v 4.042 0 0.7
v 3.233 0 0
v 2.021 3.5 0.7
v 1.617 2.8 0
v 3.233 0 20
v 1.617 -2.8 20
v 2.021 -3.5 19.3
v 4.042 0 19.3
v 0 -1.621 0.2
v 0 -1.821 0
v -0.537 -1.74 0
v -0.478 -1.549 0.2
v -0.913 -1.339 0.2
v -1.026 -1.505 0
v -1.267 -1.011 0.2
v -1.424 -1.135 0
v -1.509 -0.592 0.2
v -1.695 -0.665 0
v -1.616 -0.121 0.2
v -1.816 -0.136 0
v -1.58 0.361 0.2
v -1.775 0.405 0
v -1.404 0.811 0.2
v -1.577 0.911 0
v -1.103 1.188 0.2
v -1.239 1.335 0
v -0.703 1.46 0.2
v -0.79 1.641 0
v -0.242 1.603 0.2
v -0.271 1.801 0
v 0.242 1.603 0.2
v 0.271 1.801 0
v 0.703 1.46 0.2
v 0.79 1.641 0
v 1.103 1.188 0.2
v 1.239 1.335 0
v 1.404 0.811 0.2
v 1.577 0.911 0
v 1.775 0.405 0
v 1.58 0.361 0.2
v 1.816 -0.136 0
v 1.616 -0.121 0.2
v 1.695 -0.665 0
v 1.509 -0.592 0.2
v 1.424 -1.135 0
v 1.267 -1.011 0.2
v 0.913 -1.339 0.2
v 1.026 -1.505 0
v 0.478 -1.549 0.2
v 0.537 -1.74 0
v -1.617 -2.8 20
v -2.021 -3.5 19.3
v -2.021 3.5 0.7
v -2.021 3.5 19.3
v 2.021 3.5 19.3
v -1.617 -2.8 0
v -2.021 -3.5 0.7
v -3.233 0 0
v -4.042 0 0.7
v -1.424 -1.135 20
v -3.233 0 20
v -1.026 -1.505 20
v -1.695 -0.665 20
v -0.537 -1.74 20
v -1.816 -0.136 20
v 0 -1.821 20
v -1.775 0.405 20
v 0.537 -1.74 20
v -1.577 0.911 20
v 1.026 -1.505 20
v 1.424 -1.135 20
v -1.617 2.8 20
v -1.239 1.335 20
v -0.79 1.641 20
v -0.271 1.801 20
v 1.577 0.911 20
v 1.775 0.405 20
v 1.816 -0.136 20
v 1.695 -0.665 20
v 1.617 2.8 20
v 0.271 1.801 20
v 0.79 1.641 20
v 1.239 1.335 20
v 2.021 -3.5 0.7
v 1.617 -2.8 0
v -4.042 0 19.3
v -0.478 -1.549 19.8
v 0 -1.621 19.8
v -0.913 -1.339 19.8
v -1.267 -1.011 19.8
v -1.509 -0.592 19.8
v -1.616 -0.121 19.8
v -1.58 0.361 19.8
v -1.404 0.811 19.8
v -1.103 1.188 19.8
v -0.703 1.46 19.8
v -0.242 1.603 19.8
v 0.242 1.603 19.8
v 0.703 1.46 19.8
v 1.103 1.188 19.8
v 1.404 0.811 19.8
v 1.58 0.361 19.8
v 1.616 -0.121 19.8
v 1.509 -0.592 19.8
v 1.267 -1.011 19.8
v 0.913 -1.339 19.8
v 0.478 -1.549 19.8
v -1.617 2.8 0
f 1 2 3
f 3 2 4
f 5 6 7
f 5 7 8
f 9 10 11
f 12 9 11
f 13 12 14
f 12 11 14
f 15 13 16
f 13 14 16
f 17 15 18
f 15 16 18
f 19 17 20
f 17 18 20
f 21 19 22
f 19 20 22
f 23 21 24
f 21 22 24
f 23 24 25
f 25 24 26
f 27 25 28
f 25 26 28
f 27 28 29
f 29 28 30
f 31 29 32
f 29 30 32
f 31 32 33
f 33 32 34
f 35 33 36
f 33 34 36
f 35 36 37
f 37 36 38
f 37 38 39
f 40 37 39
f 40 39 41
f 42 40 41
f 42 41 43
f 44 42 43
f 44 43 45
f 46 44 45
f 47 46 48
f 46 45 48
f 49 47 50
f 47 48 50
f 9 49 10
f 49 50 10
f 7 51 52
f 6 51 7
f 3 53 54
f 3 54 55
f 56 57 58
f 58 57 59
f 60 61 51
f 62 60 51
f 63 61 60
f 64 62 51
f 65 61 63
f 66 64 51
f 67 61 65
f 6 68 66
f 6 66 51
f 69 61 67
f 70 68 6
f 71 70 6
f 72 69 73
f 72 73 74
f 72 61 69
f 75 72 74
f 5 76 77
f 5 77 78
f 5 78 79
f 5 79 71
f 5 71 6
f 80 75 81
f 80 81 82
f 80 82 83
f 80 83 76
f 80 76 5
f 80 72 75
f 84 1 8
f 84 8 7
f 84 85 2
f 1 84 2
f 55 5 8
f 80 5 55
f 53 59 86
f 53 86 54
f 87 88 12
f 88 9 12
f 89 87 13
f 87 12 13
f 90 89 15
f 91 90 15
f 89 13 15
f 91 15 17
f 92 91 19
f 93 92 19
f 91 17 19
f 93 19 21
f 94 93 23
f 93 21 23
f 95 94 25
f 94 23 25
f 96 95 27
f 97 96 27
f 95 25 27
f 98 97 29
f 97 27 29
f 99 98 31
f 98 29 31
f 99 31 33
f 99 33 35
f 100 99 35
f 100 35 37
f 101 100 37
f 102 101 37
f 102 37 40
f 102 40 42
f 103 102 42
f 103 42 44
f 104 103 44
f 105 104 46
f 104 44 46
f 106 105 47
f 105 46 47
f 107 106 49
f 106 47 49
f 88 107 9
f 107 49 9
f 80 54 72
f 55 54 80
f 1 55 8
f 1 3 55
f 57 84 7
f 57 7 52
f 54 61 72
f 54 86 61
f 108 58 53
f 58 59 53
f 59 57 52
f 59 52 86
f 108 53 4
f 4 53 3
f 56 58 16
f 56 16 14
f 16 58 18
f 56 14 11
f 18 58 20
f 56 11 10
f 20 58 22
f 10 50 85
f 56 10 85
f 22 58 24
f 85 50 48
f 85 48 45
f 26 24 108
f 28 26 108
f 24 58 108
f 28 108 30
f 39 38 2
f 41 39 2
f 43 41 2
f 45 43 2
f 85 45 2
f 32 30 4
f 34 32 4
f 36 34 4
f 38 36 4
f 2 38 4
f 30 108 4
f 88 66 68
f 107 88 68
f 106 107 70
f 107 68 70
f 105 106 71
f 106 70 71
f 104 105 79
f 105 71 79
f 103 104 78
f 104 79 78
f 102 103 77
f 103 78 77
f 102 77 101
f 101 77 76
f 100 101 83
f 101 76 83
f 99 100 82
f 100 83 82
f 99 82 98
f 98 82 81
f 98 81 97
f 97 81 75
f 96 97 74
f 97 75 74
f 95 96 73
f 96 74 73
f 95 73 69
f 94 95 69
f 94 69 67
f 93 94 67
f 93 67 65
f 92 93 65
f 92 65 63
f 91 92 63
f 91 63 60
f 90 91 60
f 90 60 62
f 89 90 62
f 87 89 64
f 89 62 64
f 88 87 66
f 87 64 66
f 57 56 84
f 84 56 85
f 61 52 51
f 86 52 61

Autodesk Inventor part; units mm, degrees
ref_plane "YZ Plane" through (0, 0, 0) normal (1, 0, 0) x (0, 1, 0)
ref_plane "XZ Plane" through (0, 0, 0) normal (0, 1, 0) x (-1, 0, 0)
ref_plane "XY Plane" through (0, 0, 0) normal (0, 0, 1) x (1, 0, 0)
sketch "Skizze1" plane through (0, 0, 0) normal (0, 0, 1) x (1, 0, 0)
  line L0 (4.0415, 0) -> (2.0207, -3.5)
  line L1 (2.0207, -3.5) -> (-2.0207, -3.5)
  line L2 (-2.0207, -3.5) -> (-4.0415, 0)
  line L3 (-4.0415, 0) -> (-2.0207, 3.5)
  line L4 (-2.0207, 3.5) -> (2.0207, 3.5)
  line L5 (2.0207, 3.5) -> (4.0415, 0)
  point P0 (0, 0)
  point P1 (0, 0)
  dimension "d0" = 7
extrude "Extrusion1" add sketch "Skizze1" along normal blind 20
sketch "Skizze2" plane through (0, 0, 20) normal (0, 0, 1) x (1, 0, 0)
  point P0 (0, 0)
hole "Bohrung1" at (0, 0, 20) direction (0, 0, -1) diameter 3.242 end through all thread size "M4x0.7" class "6H" standard "ISO Metric profile"
chamfer "Fase2" distance 0.7 angle 45 12 edges at (3.0311, -1.75, 20) (0, -3.5, 20) (-3.0311, -1.75, 20) (-3.0311, 1.75, 20) (0, 3.5, 20) (3.0311, 1.75, 20) (0, -3.5, 0) (3.0311, -1.75, 0) (3.0311, 1.75, 0) (0, 3.5, 0) (-3.0311, 1.75, 0) (-3.0311, -1.75, 0)
chamfer "Fase3" distance 0.2 angle 45 2 edges at (0, 1.621, 20) (0, 1.621, 0)
properties part number "Distanzhuelse_M4x20mm" material "Nickel-Kupfer-Legierung 400"
